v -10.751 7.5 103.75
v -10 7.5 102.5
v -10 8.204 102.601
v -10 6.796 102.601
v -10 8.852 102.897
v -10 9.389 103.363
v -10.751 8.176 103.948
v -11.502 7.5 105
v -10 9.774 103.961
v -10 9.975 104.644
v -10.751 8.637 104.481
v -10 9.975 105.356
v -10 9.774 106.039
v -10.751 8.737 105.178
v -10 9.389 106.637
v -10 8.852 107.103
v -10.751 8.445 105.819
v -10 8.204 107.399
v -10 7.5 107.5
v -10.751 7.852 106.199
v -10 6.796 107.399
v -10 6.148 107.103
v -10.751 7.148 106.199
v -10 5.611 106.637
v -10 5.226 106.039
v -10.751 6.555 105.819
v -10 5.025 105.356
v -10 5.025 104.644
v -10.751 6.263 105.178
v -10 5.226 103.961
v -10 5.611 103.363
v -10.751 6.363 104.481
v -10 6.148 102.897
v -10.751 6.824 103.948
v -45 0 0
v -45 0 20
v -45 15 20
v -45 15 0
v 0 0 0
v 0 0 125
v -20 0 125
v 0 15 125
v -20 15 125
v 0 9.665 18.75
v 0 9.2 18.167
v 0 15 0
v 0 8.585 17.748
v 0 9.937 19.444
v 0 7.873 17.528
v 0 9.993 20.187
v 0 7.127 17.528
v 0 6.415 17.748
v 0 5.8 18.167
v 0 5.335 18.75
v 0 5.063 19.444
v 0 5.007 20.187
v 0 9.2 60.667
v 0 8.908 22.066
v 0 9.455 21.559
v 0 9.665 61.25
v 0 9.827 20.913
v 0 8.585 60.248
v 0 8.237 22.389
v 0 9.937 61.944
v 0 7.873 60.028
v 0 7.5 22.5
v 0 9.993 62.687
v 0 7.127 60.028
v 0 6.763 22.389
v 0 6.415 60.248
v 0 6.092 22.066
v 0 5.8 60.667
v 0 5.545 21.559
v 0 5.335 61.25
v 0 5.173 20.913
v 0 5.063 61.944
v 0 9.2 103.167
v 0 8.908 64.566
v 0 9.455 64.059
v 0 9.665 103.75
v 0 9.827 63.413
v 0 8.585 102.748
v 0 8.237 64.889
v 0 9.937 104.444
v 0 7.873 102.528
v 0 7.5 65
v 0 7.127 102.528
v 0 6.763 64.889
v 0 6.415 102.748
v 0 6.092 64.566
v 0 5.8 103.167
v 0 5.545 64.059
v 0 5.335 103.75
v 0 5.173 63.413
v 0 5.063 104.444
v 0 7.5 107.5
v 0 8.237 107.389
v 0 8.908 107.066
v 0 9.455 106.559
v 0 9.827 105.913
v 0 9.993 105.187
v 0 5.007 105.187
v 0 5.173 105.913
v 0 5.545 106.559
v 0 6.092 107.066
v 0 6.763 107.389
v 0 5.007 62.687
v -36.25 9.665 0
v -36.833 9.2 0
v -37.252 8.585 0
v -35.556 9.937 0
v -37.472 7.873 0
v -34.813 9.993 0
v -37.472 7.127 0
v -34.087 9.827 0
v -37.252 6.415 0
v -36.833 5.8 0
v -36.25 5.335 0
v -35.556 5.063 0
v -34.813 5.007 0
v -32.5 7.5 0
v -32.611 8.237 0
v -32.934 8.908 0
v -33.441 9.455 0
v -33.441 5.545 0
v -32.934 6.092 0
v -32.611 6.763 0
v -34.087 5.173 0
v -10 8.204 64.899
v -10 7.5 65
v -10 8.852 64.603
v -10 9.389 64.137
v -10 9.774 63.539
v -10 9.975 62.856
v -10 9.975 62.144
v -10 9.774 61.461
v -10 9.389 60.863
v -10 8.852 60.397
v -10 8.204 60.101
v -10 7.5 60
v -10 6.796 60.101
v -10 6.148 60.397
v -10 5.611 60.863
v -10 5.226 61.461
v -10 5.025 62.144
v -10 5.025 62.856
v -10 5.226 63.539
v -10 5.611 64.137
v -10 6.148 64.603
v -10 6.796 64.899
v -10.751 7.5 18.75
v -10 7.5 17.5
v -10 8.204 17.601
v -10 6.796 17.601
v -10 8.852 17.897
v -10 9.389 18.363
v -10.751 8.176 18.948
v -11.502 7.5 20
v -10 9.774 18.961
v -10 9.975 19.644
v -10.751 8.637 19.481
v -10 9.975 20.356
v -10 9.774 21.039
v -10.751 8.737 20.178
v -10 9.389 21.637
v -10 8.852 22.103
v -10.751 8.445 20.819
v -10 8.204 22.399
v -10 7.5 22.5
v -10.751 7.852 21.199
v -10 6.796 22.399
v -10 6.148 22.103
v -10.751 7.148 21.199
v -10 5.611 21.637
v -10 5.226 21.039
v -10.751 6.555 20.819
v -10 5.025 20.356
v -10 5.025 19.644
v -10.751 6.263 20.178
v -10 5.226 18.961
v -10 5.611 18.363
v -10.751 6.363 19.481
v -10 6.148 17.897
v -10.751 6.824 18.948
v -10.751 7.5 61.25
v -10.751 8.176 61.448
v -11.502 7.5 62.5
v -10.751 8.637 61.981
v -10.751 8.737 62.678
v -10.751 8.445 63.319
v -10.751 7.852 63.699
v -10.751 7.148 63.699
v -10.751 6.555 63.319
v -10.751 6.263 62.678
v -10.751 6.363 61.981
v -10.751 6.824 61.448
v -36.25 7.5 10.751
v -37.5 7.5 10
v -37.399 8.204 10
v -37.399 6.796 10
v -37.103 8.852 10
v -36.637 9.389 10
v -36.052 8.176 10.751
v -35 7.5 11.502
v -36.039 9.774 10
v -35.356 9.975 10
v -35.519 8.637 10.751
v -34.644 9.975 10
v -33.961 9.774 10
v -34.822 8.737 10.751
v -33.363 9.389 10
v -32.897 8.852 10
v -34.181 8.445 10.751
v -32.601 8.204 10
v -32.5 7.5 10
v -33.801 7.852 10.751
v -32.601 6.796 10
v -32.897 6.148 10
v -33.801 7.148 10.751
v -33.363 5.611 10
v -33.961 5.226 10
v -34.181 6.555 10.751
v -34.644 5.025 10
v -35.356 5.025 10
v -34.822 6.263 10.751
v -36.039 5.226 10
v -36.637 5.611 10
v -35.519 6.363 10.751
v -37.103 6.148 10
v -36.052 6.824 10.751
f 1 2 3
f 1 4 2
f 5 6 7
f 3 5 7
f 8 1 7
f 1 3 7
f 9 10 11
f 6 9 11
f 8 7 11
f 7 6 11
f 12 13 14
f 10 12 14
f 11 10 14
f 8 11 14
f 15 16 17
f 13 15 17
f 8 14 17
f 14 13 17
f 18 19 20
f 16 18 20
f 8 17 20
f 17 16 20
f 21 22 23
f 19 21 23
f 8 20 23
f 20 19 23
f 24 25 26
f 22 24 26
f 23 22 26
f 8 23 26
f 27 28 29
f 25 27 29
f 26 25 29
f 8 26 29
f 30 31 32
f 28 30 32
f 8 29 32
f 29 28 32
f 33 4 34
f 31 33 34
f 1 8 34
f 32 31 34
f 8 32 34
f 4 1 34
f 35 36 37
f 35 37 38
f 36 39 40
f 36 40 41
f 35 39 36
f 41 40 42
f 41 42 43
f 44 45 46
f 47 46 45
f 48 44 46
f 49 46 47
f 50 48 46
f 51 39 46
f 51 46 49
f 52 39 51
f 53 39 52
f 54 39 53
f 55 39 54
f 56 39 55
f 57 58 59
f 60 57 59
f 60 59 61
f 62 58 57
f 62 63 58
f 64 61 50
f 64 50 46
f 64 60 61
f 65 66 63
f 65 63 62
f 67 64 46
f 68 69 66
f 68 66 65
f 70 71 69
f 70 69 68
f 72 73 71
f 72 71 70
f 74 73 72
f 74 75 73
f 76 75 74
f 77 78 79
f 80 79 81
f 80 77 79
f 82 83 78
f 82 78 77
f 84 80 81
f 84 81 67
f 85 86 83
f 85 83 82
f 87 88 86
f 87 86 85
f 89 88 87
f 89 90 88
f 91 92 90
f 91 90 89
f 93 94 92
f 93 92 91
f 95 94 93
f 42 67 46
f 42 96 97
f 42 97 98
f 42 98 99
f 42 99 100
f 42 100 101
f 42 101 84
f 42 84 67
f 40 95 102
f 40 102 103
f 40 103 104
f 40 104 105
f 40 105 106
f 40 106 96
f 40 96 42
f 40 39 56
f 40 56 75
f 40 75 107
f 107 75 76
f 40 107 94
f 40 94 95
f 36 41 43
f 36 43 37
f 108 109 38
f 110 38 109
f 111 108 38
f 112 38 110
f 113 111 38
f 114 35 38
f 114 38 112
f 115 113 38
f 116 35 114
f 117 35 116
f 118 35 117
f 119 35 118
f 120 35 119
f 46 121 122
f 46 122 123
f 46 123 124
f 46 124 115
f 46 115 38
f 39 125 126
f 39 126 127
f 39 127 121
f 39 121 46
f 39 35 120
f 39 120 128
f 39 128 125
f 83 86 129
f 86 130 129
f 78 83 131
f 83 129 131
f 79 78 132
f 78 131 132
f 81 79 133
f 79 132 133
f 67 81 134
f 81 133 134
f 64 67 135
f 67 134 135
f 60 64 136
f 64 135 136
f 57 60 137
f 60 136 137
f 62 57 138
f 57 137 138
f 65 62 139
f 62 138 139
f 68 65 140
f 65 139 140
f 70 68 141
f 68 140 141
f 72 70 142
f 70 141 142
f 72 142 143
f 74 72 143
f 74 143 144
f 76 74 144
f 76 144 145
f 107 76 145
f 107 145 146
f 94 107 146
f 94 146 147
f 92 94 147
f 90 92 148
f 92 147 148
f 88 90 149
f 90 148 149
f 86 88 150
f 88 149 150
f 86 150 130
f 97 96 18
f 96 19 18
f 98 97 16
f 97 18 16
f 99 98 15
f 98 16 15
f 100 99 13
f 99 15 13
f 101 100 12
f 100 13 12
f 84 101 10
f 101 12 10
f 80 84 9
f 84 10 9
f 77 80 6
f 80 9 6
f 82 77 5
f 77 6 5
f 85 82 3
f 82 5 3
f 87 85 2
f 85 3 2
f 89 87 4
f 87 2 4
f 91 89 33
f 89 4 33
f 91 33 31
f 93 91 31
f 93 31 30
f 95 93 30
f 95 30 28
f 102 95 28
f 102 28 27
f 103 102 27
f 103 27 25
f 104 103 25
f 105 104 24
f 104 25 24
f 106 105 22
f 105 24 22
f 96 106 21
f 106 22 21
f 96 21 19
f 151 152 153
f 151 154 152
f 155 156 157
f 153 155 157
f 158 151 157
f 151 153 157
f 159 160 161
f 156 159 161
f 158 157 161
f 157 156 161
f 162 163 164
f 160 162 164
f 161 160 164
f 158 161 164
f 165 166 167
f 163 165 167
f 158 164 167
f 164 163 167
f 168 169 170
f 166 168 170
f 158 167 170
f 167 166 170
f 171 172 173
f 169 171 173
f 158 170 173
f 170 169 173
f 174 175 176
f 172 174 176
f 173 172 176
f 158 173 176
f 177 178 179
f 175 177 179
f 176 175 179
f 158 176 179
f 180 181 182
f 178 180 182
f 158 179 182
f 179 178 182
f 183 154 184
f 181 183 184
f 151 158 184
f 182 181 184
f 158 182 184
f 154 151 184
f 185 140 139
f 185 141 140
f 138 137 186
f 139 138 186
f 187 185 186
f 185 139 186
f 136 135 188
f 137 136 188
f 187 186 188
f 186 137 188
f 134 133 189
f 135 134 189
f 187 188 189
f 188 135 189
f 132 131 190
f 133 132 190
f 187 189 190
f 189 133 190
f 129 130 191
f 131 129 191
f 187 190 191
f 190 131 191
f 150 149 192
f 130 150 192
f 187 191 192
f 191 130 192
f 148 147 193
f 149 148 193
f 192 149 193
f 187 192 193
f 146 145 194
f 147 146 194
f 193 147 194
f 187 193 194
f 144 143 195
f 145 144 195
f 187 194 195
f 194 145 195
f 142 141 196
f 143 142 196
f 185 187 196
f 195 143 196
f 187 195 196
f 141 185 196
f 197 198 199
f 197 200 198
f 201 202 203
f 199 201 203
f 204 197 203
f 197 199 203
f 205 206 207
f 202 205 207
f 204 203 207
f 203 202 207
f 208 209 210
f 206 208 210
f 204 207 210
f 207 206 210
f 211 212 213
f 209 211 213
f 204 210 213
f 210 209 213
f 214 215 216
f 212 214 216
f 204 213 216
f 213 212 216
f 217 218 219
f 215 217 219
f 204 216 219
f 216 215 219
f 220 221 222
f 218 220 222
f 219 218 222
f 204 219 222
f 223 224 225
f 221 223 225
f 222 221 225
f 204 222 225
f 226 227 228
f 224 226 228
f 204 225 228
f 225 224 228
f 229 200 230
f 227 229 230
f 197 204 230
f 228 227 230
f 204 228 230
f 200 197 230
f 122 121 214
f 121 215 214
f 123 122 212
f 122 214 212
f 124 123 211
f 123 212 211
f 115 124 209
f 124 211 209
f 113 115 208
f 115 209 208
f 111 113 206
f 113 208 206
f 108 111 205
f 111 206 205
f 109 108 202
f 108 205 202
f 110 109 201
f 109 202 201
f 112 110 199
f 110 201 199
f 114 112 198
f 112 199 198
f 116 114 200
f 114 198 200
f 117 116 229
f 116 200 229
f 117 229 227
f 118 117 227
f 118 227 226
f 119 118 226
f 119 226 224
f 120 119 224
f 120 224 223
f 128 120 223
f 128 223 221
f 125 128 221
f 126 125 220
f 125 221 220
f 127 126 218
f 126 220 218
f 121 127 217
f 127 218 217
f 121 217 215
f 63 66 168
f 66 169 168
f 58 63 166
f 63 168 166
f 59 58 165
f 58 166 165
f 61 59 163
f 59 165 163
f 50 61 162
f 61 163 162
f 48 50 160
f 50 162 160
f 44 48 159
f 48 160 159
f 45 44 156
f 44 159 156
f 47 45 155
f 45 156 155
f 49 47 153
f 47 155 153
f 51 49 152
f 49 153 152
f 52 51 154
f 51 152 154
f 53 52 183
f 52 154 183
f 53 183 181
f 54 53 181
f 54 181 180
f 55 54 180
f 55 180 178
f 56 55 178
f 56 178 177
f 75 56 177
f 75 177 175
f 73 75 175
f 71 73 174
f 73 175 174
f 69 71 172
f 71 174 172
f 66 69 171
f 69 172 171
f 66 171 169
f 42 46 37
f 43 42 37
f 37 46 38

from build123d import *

# Parameters (mm, degrees)
BOSS_EXTRUDE1_DEPTH   = 15
M6_TAPPED_HOLE1_D     = 5
M6_TAPPED_HOLE1_DEPTH = 10
M6_TAPPED_HOLE1_TIP   = 1.502151548
M6_TAPPED_HOLE2_D     = 5
M6_TAPPED_HOLE2_DEPTH = 10
M6_TAPPED_HOLE2_TIP   = 1.502151548


with BuildPart() as part:
    # Sketch1 → Boss-Extrude1 (new body)
    with BuildSketch(Plane(origin=(0, 0, 0), x_dir=(1, 0, 0), z_dir=(0, 1, 0))):
        Polygon((0, 0), (0, -125), (-20, -125), (-45, -20), (-45, 0), align=None)
    extrude(amount=BOSS_EXTRUDE1_DEPTH)

    # M6 Tapped Hole1
    with Locations(Plane(origin=(0, 0, 0), x_dir=(-1, 0, 0), z_dir=(0, 0, -1))):
        with Locations((35, 7.5)):
            Hole(M6_TAPPED_HOLE1_D / 2, depth=M6_TAPPED_HOLE1_DEPTH)
            with Locations((0, 0, -(M6_TAPPED_HOLE1_DEPTH + M6_TAPPED_HOLE1_TIP / 2))):  # 118° drill point
                Cone(0, M6_TAPPED_HOLE1_D / 2, M6_TAPPED_HOLE1_TIP, mode=Mode.SUBTRACT)

    # M6 Tapped Hole2
    with Locations(Plane(origin=(0, 0, 0), x_dir=(0, 0, -1), z_dir=(1, 0, 0))):
        with Locations((-105, 7.5), (-62.5, 7.5), (-20, 7.5)):
            Hole(M6_TAPPED_HOLE2_D / 2, depth=M6_TAPPED_HOLE2_DEPTH)
            with Locations((0, 0, -(M6_TAPPED_HOLE2_DEPTH + M6_TAPPED_HOLE2_TIP / 2))):  # 118° drill point
                Cone(0, M6_TAPPED_HOLE2_D / 2, M6_TAPPED_HOLE2_TIP, mode=Mode.SUBTRACT)


solid = part.part
